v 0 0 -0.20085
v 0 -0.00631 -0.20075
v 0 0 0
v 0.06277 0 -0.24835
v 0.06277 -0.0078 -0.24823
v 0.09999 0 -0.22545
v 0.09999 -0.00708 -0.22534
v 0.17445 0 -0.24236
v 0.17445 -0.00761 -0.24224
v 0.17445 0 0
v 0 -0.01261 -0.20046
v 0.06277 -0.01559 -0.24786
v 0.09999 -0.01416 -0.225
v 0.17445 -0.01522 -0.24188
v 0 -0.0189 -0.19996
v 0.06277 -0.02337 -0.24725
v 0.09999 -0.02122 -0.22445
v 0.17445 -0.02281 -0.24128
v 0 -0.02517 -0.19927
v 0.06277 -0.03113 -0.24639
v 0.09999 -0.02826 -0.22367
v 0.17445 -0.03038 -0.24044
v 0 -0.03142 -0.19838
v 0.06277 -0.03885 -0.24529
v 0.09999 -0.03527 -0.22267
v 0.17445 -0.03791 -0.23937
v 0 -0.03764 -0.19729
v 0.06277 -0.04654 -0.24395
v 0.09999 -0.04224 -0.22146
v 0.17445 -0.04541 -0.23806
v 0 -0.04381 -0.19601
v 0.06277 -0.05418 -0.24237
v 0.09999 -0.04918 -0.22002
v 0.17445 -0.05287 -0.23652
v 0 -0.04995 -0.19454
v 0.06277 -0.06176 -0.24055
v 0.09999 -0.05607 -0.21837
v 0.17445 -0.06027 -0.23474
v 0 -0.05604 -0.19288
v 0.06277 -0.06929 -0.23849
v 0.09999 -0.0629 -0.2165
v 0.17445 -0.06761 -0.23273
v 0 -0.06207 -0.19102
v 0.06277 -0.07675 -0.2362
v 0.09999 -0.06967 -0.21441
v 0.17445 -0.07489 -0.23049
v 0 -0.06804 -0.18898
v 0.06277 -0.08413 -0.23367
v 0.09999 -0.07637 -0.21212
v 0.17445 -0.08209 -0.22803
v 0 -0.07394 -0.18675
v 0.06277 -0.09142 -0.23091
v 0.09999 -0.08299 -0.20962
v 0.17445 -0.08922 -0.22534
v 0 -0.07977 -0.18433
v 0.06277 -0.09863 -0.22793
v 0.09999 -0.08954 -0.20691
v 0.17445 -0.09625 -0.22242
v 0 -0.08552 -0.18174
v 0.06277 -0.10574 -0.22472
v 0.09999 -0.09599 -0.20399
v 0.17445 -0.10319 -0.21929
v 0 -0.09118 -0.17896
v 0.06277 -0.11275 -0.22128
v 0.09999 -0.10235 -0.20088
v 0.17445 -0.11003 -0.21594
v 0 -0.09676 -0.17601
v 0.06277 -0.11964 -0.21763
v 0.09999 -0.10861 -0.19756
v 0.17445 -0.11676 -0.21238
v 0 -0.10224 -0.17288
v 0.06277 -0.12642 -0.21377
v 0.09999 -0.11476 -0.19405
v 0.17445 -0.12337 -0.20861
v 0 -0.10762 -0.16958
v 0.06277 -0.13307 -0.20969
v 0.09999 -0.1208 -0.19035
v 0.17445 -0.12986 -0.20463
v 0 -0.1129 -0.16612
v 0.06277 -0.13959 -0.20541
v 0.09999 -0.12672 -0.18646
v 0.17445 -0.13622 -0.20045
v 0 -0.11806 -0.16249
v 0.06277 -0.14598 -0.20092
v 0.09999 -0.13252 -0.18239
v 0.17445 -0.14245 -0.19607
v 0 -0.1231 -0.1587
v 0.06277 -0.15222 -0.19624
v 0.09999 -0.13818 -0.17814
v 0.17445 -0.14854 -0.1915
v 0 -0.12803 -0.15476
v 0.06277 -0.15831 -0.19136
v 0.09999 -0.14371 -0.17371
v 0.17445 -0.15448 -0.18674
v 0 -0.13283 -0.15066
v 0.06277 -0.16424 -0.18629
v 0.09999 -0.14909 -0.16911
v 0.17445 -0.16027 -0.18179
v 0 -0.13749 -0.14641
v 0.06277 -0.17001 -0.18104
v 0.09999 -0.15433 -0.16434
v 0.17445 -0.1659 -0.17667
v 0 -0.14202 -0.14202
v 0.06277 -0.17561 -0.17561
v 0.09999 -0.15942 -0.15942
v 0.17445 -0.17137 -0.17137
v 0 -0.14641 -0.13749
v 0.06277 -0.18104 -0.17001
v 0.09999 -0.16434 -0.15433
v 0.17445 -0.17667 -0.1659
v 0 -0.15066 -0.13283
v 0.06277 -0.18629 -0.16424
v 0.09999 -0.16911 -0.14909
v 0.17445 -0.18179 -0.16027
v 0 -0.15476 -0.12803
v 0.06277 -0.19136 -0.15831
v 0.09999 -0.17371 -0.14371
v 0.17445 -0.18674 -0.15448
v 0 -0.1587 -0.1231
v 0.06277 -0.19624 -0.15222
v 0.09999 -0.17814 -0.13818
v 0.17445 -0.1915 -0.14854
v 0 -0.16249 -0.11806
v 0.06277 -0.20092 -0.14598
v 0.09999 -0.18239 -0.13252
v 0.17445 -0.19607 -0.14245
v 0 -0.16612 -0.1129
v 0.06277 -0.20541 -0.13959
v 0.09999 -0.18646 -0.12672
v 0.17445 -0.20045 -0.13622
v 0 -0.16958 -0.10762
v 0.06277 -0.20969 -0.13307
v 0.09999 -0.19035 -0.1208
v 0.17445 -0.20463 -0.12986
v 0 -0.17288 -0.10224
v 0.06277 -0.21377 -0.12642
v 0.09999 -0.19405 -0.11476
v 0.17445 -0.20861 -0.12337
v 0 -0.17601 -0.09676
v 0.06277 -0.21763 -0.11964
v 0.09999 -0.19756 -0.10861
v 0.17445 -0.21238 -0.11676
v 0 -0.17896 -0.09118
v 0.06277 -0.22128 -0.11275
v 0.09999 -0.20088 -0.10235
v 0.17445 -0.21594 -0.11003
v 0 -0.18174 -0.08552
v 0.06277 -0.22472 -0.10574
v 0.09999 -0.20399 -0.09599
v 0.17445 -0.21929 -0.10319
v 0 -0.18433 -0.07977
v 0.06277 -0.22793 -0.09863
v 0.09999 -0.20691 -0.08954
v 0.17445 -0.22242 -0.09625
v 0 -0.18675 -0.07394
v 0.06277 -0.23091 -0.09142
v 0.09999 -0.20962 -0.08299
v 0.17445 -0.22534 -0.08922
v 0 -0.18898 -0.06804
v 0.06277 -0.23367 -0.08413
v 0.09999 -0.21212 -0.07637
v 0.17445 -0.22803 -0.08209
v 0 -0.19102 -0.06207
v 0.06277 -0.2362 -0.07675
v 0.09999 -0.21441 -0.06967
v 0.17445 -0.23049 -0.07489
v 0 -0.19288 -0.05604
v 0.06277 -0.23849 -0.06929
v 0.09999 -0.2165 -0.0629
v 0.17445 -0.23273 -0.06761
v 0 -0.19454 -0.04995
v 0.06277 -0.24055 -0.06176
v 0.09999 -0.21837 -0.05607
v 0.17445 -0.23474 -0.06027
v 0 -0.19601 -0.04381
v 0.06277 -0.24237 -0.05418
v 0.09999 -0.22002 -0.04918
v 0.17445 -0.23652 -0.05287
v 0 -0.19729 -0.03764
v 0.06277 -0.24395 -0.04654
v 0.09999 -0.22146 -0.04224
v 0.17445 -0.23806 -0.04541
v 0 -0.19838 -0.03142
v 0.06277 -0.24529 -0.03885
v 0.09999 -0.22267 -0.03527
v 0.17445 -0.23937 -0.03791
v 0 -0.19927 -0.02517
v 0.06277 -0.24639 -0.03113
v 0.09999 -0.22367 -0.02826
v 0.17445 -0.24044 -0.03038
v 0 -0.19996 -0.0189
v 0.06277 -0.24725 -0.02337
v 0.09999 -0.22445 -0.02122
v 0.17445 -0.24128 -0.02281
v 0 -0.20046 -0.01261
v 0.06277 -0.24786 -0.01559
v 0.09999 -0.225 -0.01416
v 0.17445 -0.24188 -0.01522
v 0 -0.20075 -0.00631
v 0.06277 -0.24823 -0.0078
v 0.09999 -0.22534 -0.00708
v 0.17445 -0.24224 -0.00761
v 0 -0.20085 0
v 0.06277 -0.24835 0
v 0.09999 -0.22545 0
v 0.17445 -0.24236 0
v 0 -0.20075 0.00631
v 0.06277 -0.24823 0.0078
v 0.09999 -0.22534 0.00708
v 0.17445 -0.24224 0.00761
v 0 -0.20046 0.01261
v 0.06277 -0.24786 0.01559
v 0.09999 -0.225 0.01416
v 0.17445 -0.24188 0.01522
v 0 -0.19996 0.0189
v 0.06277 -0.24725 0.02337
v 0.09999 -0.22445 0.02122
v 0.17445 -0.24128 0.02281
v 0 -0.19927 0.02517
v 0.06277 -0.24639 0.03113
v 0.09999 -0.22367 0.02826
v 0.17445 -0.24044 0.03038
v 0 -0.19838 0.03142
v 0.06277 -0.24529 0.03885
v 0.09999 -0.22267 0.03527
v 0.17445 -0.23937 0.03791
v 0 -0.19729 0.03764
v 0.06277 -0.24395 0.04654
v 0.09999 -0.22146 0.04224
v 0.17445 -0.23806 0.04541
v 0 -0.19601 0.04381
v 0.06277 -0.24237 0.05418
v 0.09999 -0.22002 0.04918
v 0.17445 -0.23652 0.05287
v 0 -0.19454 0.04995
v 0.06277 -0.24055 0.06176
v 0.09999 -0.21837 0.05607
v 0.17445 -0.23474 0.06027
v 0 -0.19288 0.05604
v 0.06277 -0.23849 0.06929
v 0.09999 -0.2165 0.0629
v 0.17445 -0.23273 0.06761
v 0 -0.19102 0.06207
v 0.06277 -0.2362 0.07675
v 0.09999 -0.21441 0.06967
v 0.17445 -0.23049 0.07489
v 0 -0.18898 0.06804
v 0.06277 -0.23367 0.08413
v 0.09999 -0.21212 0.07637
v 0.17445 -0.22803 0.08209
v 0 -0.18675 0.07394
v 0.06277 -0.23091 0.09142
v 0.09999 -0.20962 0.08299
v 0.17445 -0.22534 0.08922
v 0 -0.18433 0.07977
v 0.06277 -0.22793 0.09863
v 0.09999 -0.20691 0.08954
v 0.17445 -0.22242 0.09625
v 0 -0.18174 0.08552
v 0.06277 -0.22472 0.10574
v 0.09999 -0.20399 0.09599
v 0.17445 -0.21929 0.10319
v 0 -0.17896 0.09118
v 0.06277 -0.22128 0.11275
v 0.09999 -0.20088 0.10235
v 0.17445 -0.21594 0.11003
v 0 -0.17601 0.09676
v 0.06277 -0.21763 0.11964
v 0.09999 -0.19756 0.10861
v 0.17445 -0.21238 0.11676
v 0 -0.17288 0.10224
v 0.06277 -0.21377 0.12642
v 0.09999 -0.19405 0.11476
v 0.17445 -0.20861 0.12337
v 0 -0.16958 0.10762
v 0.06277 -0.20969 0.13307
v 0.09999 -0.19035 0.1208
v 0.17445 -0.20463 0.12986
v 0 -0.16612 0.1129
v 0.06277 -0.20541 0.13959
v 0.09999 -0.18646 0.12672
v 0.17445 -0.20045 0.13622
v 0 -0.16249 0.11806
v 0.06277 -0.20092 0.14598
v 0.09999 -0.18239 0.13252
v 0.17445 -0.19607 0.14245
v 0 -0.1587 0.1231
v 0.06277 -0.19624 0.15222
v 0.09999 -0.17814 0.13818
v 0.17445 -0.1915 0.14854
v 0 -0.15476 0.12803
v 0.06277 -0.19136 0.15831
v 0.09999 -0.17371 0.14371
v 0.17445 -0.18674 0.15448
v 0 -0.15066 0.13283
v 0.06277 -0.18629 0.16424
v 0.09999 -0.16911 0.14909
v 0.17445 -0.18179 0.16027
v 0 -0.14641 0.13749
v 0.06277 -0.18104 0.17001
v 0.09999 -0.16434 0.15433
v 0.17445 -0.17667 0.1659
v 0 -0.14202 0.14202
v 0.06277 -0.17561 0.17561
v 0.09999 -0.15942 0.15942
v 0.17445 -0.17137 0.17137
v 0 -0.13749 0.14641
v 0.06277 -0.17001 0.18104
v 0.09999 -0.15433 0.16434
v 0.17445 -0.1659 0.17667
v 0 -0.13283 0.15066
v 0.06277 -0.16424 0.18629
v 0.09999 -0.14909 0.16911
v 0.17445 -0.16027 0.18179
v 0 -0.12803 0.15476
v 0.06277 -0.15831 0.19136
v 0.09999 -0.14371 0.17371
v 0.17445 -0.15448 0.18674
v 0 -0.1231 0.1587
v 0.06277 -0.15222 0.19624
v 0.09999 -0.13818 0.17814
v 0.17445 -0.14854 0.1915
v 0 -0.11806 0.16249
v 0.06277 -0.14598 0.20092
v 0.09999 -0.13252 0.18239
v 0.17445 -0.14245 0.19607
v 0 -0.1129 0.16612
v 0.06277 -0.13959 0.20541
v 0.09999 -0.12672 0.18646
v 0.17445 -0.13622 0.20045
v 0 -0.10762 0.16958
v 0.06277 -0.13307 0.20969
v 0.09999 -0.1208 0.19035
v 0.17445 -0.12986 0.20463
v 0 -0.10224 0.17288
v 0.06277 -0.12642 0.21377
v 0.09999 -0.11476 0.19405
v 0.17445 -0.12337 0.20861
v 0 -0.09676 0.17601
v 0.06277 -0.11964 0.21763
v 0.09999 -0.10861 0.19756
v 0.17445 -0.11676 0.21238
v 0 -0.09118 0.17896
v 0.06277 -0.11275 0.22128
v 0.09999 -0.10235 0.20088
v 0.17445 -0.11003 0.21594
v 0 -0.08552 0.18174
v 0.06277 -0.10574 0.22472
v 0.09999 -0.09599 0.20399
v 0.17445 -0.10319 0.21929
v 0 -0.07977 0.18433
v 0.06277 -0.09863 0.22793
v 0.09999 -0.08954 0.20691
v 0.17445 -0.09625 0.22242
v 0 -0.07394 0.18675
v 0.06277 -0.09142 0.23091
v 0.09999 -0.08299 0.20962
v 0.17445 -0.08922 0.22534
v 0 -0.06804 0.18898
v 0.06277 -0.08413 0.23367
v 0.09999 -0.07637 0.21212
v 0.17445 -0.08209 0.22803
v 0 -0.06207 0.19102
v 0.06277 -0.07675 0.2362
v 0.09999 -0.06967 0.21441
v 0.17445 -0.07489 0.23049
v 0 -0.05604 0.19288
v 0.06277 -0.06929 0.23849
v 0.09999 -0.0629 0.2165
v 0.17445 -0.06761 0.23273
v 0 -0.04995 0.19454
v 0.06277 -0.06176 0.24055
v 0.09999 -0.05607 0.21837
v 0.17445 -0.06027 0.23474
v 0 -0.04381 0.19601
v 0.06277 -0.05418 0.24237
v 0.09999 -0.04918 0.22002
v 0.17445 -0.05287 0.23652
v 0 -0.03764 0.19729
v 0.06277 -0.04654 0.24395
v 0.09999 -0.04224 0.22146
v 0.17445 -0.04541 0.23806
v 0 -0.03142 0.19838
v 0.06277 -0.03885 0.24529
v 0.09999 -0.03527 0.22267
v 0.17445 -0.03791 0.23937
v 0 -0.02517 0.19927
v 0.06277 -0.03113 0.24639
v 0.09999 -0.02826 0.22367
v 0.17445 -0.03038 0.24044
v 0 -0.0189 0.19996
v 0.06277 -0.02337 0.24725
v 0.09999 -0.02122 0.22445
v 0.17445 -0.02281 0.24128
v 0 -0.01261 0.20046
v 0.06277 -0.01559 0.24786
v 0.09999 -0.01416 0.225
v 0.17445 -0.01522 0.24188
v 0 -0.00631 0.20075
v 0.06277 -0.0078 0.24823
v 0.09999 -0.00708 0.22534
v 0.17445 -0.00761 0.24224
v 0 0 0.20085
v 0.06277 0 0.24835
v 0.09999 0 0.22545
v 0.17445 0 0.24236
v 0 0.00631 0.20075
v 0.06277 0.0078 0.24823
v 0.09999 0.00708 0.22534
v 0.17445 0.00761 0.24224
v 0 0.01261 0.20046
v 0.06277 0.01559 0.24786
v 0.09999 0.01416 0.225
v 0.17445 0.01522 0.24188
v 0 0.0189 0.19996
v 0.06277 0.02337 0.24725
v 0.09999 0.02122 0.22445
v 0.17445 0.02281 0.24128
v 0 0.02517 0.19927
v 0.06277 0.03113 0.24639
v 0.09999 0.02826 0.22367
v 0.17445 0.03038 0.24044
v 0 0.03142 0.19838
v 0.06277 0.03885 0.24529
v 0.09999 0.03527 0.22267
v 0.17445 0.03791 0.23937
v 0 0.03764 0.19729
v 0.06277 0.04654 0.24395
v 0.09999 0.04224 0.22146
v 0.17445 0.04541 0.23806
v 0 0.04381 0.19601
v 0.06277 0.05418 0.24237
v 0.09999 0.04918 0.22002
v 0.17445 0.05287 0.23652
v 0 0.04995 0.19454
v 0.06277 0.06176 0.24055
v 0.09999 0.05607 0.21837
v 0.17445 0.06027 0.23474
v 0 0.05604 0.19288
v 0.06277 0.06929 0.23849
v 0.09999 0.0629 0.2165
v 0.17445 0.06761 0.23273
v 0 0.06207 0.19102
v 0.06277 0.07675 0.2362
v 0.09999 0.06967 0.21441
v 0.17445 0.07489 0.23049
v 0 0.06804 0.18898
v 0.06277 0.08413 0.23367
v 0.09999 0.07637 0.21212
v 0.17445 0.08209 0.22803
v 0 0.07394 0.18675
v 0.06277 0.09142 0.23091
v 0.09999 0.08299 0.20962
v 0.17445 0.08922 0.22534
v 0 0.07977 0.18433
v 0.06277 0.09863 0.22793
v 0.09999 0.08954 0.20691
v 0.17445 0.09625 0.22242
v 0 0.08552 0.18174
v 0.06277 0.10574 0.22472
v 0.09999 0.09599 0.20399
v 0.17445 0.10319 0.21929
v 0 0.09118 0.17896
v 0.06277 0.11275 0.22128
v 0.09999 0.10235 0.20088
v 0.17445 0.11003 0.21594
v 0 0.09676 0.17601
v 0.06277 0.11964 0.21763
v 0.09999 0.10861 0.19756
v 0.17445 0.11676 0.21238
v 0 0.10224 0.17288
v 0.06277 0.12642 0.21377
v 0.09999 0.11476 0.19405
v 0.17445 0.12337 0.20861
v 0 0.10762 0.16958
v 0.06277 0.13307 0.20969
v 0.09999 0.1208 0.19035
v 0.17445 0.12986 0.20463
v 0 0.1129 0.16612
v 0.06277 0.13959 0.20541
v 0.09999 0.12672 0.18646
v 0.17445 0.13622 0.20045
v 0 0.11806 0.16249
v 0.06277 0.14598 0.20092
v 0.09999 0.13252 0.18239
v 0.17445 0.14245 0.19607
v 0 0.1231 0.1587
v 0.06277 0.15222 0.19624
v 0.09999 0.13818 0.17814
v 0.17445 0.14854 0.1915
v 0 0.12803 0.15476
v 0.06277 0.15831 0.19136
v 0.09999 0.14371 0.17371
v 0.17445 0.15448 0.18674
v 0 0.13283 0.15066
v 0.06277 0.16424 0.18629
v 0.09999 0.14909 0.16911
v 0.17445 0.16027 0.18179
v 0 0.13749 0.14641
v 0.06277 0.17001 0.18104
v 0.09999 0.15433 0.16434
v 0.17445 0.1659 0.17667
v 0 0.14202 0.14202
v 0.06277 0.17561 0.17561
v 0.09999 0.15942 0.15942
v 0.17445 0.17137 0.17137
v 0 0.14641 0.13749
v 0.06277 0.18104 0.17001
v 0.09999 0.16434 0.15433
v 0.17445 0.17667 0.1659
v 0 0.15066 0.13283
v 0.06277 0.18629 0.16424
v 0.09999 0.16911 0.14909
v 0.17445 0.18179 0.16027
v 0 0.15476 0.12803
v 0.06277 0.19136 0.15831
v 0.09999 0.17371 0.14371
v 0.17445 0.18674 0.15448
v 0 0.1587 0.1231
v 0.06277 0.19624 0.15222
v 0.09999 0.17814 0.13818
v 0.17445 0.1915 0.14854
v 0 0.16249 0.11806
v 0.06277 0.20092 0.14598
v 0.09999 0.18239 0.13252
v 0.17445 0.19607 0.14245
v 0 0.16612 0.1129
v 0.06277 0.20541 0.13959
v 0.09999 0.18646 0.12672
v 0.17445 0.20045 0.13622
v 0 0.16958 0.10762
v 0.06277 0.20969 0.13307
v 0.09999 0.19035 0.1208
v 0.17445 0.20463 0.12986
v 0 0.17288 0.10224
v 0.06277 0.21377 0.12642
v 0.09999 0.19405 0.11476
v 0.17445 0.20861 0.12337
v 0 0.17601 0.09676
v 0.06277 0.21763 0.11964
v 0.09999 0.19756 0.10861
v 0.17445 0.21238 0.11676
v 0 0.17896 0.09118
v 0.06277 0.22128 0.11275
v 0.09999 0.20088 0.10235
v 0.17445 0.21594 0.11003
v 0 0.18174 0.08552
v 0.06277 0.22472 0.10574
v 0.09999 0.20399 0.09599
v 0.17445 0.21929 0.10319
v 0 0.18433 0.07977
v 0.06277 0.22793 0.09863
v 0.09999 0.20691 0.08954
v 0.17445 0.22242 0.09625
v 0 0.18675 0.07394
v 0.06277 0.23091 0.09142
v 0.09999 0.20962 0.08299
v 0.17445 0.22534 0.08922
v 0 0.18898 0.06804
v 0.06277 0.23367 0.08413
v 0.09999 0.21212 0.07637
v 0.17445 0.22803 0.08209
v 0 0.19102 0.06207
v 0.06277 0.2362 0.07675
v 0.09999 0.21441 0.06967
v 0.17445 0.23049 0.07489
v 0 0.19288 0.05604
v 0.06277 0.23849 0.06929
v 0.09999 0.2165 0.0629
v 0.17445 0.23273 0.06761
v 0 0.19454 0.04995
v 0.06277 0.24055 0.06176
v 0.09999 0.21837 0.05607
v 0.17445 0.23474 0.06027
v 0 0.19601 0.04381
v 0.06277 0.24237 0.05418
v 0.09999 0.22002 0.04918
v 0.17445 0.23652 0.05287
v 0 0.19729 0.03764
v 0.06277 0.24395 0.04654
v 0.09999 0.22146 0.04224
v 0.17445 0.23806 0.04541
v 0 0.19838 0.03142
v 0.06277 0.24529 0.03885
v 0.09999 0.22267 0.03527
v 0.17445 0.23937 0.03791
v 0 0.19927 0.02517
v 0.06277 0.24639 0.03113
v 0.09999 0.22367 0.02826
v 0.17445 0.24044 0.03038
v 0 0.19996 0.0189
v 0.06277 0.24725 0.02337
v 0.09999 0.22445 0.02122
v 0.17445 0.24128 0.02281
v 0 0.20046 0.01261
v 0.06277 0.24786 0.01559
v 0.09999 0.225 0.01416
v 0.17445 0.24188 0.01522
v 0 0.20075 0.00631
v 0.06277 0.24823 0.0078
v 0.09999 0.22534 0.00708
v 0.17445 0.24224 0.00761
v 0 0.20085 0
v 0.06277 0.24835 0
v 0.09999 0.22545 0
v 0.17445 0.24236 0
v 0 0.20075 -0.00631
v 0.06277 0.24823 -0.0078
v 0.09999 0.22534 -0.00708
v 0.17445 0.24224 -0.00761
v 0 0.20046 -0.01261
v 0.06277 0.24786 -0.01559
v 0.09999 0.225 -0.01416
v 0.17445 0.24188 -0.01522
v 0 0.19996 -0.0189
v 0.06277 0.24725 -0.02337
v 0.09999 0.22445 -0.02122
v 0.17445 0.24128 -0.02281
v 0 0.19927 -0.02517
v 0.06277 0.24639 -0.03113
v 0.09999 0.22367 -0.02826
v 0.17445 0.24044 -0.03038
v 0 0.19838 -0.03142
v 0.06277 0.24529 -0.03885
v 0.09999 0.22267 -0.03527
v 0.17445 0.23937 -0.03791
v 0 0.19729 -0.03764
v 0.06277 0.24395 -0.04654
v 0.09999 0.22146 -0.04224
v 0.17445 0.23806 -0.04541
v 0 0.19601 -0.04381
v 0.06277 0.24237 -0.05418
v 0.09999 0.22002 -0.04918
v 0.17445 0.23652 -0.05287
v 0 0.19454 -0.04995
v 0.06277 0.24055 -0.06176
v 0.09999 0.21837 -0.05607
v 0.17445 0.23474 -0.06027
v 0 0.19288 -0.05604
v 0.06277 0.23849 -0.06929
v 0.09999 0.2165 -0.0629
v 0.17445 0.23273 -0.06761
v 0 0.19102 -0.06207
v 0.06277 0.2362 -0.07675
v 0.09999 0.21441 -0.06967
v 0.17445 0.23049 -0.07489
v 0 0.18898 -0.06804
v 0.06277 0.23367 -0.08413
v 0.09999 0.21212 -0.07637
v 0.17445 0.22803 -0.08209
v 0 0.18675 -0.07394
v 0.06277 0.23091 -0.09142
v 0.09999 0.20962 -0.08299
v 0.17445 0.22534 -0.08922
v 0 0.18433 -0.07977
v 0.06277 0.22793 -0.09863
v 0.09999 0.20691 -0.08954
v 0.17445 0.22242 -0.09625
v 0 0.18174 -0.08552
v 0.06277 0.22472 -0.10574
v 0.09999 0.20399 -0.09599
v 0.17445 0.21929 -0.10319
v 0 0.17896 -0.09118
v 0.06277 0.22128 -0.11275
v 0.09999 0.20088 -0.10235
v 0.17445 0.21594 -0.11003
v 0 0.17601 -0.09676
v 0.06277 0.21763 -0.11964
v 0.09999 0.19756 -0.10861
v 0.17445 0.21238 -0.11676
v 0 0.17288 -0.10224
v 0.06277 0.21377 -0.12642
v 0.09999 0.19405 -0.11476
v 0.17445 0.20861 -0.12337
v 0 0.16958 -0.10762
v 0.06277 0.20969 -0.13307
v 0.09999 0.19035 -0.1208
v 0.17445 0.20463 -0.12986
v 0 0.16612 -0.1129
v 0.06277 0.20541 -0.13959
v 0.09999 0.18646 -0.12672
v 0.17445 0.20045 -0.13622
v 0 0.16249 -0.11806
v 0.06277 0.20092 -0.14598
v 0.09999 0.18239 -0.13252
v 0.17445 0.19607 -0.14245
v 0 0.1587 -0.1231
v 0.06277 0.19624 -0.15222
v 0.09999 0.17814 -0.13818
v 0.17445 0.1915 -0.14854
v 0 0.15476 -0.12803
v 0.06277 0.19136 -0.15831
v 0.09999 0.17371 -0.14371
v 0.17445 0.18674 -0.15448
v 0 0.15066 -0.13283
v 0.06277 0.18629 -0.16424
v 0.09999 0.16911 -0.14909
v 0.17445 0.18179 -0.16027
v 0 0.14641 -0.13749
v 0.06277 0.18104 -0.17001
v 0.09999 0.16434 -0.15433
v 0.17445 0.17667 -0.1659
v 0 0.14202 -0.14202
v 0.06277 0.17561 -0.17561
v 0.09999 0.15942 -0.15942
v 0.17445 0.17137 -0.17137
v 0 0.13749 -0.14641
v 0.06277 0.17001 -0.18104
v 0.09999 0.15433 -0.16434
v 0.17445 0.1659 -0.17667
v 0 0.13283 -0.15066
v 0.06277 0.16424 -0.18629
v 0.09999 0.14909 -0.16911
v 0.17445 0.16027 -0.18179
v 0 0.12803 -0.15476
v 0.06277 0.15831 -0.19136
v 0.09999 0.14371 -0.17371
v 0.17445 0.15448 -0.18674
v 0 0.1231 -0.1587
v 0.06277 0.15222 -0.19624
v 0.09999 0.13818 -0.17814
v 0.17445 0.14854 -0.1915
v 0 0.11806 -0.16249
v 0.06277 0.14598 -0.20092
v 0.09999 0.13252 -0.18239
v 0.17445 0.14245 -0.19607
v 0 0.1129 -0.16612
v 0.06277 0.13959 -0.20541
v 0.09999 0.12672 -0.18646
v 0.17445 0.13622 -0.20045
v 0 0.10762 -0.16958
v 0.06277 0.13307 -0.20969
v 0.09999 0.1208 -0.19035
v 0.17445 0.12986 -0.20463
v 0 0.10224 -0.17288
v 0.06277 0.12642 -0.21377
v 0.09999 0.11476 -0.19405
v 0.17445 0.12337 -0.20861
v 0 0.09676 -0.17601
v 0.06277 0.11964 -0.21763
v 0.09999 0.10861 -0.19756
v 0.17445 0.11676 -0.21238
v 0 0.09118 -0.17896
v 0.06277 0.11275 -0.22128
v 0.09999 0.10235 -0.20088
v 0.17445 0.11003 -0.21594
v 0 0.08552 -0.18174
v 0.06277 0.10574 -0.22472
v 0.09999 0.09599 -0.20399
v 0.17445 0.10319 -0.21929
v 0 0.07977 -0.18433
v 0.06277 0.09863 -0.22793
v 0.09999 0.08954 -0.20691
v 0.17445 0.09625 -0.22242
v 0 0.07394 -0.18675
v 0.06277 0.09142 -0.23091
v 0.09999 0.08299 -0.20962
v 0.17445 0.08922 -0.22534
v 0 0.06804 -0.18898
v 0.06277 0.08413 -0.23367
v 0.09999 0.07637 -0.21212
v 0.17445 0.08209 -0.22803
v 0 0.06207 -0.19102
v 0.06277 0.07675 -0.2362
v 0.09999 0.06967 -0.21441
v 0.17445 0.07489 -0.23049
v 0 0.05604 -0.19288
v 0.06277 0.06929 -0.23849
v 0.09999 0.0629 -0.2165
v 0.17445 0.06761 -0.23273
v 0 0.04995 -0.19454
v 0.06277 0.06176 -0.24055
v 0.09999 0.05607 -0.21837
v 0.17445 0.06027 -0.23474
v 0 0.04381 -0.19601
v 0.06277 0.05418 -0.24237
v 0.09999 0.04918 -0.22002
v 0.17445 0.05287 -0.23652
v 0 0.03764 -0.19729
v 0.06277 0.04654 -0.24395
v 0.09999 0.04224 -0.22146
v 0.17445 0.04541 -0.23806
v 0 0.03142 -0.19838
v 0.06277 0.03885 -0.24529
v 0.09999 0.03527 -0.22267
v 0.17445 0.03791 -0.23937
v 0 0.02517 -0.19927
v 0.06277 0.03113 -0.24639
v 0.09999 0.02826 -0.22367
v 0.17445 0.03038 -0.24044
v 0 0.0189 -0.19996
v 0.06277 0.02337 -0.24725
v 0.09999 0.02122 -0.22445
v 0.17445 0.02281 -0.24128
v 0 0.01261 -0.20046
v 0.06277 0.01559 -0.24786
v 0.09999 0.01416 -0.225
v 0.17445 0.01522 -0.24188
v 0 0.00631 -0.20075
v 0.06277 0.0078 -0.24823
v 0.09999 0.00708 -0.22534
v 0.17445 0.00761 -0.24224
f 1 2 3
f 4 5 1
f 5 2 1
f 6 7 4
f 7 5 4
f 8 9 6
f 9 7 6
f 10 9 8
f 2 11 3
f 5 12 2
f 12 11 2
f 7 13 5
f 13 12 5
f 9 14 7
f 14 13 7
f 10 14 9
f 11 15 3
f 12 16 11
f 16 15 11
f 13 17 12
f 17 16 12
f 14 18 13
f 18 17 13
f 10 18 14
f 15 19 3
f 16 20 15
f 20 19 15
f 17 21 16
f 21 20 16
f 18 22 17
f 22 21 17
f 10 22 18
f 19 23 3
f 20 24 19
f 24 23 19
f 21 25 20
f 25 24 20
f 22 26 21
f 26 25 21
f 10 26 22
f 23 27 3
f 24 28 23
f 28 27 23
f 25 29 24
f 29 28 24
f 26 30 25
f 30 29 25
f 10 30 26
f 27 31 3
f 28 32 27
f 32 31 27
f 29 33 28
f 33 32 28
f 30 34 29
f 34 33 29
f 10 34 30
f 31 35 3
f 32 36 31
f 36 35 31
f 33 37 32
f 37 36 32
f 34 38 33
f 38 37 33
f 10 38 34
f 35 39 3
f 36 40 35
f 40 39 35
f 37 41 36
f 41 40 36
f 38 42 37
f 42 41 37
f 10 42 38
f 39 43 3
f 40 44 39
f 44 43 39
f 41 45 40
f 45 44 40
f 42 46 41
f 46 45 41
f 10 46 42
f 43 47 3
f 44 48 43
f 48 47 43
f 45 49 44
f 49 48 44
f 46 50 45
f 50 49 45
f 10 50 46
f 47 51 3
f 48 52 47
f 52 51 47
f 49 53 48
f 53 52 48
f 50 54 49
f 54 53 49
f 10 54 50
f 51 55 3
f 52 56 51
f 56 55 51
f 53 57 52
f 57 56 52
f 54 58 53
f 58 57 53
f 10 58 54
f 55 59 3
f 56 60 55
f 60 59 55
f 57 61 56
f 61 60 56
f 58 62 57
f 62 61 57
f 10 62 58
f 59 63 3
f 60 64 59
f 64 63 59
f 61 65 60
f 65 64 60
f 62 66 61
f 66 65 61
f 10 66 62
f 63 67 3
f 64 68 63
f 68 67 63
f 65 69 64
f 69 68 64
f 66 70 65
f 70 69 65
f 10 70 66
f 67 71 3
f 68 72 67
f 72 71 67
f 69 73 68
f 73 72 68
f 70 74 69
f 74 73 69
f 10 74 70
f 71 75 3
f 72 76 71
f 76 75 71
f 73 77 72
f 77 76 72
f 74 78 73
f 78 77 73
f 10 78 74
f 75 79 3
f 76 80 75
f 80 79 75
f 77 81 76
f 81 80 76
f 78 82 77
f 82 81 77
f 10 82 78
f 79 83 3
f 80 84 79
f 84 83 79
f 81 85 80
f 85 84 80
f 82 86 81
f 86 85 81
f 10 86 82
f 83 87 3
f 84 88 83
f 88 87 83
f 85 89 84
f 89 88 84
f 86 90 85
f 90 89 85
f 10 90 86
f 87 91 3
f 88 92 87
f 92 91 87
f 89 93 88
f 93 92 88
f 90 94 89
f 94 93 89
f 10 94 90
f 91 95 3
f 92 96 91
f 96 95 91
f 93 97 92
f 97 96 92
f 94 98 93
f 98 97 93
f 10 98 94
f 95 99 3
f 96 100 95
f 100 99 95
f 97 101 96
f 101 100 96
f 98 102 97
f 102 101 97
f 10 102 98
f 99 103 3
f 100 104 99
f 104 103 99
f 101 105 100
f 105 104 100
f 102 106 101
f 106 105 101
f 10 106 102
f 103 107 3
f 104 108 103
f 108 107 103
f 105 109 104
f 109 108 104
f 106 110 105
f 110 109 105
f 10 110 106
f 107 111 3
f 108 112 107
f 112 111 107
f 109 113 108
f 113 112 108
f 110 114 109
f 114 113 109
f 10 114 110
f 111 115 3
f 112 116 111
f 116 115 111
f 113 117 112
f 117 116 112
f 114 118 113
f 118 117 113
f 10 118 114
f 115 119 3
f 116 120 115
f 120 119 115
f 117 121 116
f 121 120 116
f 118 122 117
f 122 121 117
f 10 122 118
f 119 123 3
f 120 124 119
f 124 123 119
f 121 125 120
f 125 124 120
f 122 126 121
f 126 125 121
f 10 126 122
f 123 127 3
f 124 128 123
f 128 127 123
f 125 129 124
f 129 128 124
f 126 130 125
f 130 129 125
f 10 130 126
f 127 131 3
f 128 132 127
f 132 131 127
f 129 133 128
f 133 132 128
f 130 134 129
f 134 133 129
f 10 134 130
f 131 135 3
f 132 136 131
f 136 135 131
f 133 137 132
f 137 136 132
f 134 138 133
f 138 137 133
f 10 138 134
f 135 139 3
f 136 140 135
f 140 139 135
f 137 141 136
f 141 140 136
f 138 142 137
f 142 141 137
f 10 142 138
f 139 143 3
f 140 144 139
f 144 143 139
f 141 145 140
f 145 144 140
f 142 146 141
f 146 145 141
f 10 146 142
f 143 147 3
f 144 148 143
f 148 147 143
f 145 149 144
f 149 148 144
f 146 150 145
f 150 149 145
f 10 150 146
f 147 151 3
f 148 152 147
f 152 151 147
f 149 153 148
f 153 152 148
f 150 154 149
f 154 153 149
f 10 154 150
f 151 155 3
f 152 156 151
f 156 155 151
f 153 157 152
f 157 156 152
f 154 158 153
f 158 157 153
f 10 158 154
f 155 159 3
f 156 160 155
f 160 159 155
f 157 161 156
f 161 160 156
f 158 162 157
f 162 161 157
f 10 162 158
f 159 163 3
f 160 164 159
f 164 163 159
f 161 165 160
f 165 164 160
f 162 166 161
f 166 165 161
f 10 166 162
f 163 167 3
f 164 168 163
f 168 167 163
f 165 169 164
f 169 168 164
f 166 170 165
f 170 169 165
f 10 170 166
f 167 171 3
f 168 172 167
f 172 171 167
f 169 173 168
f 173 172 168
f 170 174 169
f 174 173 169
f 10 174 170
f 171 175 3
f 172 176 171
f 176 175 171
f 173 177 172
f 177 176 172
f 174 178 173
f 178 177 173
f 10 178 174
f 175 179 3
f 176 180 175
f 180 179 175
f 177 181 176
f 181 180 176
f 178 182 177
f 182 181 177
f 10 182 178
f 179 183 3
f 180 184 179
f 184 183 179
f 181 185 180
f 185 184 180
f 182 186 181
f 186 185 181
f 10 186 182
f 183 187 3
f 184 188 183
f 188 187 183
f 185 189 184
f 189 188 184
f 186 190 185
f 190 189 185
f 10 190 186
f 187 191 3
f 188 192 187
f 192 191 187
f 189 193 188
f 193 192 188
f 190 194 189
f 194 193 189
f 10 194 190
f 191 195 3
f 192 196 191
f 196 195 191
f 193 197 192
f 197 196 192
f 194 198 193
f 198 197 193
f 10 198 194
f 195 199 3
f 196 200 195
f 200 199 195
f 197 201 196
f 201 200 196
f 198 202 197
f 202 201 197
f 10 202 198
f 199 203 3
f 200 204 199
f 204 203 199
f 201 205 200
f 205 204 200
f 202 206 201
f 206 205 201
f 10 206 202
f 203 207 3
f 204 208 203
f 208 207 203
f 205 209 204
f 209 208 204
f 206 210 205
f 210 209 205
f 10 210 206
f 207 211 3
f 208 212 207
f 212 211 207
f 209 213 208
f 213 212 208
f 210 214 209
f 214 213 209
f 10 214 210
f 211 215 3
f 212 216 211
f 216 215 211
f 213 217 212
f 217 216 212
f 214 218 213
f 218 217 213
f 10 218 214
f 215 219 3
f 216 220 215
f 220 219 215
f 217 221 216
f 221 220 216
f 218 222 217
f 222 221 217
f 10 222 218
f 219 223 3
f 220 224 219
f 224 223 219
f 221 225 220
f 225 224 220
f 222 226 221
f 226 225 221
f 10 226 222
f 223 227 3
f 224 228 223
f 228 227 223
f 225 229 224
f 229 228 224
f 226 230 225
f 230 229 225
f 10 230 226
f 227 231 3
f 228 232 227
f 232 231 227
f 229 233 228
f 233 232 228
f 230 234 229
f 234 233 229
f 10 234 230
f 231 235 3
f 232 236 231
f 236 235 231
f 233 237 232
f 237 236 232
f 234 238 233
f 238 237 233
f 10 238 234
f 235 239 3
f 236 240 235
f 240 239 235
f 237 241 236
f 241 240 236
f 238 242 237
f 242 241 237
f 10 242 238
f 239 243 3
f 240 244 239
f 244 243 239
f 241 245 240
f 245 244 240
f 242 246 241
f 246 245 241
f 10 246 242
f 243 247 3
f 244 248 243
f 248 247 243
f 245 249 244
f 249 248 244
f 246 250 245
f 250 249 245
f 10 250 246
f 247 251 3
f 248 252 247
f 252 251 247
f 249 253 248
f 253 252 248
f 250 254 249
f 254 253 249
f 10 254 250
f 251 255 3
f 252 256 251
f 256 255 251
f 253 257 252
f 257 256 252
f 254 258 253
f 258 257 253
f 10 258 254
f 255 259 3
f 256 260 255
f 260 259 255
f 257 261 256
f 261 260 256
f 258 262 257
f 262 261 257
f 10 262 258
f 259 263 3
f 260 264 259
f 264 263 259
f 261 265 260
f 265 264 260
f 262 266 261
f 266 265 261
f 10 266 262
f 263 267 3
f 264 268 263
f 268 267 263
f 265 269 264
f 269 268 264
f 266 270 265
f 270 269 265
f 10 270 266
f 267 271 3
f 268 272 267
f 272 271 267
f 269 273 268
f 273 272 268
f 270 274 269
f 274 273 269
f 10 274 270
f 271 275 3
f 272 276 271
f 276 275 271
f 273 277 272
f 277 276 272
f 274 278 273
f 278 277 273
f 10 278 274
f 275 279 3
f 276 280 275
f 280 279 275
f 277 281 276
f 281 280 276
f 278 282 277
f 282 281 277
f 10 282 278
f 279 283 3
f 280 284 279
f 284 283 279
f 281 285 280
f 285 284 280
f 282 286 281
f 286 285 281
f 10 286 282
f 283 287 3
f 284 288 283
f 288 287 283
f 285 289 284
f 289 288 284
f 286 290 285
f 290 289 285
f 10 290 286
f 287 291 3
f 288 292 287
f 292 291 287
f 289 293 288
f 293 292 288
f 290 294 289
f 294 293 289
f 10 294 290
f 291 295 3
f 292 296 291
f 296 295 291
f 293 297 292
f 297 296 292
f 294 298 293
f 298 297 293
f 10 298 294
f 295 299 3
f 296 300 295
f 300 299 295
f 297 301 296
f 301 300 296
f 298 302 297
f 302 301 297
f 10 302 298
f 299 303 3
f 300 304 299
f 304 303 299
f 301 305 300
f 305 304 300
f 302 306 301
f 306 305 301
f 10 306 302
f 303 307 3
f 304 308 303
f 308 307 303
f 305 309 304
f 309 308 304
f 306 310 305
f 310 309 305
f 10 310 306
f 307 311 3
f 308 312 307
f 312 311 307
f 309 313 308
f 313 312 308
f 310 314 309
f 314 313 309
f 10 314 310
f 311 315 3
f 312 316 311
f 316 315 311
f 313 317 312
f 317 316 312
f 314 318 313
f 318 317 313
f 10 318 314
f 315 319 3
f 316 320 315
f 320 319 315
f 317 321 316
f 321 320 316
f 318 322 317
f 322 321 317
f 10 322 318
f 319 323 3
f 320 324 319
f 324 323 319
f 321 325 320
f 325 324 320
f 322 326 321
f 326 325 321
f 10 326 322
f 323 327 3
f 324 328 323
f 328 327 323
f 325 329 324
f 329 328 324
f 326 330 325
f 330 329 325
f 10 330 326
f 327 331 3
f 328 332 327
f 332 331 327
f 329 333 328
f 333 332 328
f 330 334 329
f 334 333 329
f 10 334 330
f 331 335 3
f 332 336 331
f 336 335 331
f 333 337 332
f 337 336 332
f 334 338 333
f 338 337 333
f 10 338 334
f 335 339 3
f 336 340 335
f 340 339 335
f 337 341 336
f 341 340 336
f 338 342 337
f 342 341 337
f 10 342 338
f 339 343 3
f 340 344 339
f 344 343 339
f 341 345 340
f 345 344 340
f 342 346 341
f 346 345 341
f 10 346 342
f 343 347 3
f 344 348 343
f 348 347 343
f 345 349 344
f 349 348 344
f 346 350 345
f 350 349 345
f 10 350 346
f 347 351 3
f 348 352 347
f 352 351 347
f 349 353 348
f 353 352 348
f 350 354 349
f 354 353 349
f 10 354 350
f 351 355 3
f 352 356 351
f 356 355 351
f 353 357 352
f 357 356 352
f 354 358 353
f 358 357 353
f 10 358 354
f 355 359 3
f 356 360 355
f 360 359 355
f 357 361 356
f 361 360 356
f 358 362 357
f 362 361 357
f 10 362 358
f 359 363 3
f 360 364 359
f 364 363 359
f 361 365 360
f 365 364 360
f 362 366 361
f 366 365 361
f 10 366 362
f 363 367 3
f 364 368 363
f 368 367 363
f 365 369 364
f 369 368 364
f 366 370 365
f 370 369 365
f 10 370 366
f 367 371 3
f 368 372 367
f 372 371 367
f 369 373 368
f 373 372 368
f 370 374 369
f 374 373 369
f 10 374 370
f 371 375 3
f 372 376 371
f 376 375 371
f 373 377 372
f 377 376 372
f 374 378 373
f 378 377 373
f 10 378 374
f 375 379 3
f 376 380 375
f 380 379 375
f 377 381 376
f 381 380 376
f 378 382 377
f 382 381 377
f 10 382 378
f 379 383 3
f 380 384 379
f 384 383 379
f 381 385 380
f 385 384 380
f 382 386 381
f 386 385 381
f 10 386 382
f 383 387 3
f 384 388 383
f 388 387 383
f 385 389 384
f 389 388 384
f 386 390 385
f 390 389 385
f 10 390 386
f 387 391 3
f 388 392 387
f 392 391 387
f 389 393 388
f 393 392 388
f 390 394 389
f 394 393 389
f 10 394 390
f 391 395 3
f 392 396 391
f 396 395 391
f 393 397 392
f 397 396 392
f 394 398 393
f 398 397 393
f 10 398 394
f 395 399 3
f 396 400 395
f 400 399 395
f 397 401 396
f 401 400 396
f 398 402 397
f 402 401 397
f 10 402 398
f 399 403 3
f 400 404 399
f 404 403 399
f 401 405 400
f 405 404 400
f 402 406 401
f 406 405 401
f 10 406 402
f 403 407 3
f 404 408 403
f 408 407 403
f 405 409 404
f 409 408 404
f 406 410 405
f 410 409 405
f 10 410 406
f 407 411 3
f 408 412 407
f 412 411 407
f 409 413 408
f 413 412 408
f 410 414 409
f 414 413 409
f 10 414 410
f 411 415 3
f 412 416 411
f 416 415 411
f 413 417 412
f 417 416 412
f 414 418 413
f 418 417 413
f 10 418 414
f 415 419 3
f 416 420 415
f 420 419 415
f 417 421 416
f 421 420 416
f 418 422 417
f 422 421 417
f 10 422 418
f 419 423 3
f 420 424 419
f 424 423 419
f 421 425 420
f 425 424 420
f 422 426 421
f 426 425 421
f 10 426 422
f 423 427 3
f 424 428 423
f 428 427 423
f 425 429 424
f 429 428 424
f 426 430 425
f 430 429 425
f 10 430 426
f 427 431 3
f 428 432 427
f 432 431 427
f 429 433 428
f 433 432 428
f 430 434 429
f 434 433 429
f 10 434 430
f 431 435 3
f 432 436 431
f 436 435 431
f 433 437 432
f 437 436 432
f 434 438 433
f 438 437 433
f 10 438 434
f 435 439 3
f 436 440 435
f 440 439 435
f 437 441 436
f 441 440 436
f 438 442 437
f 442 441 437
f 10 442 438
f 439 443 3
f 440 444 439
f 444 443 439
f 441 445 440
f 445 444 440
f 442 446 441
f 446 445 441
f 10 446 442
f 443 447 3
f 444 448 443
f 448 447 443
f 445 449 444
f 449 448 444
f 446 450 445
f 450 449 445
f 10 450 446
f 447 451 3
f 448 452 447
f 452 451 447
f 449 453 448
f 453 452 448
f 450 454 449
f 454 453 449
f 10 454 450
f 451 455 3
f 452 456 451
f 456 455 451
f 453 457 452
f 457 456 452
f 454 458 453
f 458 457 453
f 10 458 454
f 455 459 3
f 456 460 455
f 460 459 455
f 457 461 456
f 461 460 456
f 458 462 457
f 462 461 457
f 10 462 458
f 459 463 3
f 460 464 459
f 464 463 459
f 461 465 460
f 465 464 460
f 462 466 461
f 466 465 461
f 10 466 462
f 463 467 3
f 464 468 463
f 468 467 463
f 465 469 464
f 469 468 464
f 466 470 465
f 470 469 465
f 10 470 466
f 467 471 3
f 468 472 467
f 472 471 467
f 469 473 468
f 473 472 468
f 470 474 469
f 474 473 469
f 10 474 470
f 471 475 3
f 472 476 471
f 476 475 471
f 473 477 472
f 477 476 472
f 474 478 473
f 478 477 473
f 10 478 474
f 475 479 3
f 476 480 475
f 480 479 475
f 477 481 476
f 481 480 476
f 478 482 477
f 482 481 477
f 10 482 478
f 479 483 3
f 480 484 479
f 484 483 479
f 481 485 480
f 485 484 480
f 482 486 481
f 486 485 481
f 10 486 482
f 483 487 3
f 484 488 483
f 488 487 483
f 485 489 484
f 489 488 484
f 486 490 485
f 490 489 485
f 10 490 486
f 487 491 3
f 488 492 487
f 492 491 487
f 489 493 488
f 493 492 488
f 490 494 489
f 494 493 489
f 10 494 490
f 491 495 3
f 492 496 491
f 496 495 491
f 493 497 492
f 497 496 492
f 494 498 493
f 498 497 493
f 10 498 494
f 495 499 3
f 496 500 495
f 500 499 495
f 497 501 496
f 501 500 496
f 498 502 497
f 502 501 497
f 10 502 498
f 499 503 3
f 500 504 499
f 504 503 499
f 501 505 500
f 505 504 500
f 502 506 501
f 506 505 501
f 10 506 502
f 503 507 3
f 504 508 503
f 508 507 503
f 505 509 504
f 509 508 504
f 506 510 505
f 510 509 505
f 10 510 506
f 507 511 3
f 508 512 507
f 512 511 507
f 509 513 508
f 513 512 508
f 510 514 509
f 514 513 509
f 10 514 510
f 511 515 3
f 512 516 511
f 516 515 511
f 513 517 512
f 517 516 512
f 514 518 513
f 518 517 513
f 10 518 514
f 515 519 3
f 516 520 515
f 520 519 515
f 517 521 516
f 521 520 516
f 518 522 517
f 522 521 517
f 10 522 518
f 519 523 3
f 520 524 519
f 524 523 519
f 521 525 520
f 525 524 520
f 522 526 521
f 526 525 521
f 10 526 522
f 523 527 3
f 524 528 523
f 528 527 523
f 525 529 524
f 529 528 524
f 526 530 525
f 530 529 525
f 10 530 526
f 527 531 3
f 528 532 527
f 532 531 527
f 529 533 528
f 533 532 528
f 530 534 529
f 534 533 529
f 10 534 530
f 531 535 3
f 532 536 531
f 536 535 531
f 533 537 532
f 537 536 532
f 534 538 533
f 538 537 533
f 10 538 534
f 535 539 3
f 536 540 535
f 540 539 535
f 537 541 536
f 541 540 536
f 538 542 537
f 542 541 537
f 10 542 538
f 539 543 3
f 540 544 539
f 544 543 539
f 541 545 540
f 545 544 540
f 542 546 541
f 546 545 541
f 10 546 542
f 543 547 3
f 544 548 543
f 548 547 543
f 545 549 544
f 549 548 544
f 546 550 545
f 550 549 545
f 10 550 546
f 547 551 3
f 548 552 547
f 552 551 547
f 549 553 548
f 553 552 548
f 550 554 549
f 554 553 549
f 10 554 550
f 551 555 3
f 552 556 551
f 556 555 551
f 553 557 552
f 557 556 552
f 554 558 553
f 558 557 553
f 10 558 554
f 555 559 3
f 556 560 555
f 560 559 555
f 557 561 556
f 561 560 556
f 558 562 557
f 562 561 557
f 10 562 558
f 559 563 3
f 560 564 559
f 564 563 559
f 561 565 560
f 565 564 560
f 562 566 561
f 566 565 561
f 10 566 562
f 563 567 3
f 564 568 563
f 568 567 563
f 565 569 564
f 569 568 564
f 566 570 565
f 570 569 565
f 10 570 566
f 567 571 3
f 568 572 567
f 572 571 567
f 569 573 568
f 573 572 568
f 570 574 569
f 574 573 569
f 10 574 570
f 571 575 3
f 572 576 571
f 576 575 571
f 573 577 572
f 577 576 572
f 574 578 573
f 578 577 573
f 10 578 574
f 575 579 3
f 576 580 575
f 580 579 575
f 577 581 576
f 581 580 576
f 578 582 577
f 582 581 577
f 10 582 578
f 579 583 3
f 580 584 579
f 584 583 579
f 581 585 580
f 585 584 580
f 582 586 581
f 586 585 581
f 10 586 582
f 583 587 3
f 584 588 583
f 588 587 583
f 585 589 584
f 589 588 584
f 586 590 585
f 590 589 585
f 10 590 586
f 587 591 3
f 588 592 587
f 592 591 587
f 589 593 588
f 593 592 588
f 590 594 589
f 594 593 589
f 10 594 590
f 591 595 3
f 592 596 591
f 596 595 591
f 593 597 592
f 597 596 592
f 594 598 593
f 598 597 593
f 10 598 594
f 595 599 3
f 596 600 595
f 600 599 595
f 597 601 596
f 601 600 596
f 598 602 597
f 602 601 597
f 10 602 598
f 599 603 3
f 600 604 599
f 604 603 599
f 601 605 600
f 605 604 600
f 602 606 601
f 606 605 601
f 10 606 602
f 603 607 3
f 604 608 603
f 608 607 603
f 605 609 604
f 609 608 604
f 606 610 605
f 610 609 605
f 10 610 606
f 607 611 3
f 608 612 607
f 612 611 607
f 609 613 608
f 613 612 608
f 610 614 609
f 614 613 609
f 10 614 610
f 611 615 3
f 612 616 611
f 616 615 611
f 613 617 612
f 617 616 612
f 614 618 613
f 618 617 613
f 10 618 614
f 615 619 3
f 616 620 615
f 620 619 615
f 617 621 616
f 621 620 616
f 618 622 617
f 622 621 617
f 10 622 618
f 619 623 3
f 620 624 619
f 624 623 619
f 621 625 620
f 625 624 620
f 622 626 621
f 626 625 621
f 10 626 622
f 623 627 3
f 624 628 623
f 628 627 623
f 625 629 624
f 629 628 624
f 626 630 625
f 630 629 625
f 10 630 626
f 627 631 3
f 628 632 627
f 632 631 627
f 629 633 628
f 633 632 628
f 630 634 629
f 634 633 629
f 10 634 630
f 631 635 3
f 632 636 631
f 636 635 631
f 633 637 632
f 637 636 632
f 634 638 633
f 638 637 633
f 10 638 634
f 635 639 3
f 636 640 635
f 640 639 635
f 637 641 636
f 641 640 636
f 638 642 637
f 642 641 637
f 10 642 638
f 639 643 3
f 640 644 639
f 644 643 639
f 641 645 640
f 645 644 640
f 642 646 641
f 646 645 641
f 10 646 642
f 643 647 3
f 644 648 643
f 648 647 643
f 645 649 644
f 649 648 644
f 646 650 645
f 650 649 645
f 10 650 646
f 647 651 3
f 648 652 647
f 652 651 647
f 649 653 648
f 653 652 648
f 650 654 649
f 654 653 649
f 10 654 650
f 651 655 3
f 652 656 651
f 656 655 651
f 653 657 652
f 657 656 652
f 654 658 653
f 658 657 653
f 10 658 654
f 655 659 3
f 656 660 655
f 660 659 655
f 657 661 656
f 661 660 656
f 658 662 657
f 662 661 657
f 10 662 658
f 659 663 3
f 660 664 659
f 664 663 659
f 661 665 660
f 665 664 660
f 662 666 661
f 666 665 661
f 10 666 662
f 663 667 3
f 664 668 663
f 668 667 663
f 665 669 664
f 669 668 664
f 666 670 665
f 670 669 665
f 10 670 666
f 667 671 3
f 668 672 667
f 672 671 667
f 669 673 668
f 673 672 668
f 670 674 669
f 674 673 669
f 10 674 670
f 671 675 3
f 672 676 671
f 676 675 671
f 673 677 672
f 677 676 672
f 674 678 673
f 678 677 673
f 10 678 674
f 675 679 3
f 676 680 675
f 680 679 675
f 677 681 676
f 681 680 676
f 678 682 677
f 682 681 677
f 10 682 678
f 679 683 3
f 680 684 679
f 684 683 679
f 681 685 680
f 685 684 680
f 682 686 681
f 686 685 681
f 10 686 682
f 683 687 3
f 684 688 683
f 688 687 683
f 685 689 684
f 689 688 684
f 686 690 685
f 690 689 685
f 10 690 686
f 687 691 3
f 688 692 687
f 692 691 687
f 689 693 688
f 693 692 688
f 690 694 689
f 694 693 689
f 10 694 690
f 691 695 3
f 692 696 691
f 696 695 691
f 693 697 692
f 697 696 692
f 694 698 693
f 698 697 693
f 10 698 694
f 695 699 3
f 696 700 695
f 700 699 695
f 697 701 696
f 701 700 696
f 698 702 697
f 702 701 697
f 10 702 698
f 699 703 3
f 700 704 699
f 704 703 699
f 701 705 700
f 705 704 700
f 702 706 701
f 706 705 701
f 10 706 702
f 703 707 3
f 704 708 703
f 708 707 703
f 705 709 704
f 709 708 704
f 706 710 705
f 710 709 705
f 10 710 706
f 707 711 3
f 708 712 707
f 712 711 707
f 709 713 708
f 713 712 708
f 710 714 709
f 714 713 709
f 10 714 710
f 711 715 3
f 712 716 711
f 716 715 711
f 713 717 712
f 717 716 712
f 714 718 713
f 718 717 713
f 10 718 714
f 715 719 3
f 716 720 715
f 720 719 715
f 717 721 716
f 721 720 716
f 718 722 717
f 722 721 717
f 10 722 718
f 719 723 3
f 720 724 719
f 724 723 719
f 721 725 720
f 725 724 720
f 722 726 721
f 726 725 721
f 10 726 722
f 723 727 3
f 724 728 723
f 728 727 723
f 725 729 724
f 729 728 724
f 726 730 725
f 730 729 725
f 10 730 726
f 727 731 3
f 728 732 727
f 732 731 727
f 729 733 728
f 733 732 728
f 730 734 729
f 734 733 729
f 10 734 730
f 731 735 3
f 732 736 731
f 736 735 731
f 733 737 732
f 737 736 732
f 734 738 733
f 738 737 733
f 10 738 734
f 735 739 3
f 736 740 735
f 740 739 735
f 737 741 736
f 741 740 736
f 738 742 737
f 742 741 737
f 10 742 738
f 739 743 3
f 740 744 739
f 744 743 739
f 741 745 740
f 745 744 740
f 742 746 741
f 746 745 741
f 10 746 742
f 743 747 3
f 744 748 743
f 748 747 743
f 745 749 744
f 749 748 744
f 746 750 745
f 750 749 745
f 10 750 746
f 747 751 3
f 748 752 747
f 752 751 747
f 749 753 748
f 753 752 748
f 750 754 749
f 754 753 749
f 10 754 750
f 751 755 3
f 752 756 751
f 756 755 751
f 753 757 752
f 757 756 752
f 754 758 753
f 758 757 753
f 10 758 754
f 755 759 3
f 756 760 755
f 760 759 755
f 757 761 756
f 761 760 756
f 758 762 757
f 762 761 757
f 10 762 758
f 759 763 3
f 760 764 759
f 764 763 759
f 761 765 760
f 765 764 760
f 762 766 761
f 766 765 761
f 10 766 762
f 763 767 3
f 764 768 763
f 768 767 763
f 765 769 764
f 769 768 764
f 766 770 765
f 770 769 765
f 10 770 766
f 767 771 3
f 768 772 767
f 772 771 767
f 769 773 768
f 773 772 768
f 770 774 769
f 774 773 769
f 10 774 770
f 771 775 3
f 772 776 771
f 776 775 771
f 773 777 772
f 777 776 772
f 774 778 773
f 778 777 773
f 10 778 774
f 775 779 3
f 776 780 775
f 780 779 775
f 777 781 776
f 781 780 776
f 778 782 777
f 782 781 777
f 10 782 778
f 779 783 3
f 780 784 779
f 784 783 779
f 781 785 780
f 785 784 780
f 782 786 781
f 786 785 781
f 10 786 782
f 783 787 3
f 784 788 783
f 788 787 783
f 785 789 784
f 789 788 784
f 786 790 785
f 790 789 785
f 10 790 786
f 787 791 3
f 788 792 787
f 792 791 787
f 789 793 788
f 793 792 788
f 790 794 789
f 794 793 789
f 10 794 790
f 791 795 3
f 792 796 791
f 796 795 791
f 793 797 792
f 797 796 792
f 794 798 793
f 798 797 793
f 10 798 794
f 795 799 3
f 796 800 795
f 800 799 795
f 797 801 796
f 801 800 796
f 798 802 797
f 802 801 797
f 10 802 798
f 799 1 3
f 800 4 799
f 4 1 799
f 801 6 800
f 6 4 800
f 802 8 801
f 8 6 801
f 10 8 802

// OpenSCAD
statorOrigin1 = [0.1, 0, 0.2];

// HUB
// variable allocation
rMean              = 0.325;
// rotor properties
rotorHubChord      = 0.0627869302309185;
rotorHub_xInlet    = 0.0;
rotorHub_yInlet    = 0.0;
rotorHub_zInlet    = 0.20086511551156916;
rotorHub_xOutlet   = 0.0627869302309185;
rotorHub_yOutlet   = 0.014470943474431435;
rotorHub_zOutlet   = 0.2483654691199017;
rotorHeigyhInlet   = 0.2482697689768617;
rotorHeigthOutlet  = 0.19907458767017935;
// stator properties
statorHubChord      = 0.07446010544196538;
statorHub_xInlet    = 0.0;
statorHub_yInlet    = 0.0;
statorHub_zInlet    = 0.22546270616491032;
statorHub_xOutlet   = 0.07446010544196538;
statorHub_yOutlet   = 0.030290561214741725;
statorHub_zOutlet   = 0.24235713251146196;
statorHeigthInlet   = 0.19907458767017935;
statorHeigthOutlet  = 0.18212580449864338;

// hub shape generation 
rotate([0,90,0]){
    color("Blue", 0.5){
        rotate_extrude(angle=360, $fn=200){
            rotate([0,0,90]){          
                polygon(points = [[0, 0], [rotorHub_xInlet, rotorHub_zInlet], [rotorHub_xOutlet, rotorHub_zOutlet], [statorOrigin1[0], statorHub_zInlet], [statorOrigin1[0] + statorHub_xOutlet, statorHub_zOutlet], [statorOrigin1[0] + statorHub_xOutlet, 0]]);
            };
        };
    };
};
